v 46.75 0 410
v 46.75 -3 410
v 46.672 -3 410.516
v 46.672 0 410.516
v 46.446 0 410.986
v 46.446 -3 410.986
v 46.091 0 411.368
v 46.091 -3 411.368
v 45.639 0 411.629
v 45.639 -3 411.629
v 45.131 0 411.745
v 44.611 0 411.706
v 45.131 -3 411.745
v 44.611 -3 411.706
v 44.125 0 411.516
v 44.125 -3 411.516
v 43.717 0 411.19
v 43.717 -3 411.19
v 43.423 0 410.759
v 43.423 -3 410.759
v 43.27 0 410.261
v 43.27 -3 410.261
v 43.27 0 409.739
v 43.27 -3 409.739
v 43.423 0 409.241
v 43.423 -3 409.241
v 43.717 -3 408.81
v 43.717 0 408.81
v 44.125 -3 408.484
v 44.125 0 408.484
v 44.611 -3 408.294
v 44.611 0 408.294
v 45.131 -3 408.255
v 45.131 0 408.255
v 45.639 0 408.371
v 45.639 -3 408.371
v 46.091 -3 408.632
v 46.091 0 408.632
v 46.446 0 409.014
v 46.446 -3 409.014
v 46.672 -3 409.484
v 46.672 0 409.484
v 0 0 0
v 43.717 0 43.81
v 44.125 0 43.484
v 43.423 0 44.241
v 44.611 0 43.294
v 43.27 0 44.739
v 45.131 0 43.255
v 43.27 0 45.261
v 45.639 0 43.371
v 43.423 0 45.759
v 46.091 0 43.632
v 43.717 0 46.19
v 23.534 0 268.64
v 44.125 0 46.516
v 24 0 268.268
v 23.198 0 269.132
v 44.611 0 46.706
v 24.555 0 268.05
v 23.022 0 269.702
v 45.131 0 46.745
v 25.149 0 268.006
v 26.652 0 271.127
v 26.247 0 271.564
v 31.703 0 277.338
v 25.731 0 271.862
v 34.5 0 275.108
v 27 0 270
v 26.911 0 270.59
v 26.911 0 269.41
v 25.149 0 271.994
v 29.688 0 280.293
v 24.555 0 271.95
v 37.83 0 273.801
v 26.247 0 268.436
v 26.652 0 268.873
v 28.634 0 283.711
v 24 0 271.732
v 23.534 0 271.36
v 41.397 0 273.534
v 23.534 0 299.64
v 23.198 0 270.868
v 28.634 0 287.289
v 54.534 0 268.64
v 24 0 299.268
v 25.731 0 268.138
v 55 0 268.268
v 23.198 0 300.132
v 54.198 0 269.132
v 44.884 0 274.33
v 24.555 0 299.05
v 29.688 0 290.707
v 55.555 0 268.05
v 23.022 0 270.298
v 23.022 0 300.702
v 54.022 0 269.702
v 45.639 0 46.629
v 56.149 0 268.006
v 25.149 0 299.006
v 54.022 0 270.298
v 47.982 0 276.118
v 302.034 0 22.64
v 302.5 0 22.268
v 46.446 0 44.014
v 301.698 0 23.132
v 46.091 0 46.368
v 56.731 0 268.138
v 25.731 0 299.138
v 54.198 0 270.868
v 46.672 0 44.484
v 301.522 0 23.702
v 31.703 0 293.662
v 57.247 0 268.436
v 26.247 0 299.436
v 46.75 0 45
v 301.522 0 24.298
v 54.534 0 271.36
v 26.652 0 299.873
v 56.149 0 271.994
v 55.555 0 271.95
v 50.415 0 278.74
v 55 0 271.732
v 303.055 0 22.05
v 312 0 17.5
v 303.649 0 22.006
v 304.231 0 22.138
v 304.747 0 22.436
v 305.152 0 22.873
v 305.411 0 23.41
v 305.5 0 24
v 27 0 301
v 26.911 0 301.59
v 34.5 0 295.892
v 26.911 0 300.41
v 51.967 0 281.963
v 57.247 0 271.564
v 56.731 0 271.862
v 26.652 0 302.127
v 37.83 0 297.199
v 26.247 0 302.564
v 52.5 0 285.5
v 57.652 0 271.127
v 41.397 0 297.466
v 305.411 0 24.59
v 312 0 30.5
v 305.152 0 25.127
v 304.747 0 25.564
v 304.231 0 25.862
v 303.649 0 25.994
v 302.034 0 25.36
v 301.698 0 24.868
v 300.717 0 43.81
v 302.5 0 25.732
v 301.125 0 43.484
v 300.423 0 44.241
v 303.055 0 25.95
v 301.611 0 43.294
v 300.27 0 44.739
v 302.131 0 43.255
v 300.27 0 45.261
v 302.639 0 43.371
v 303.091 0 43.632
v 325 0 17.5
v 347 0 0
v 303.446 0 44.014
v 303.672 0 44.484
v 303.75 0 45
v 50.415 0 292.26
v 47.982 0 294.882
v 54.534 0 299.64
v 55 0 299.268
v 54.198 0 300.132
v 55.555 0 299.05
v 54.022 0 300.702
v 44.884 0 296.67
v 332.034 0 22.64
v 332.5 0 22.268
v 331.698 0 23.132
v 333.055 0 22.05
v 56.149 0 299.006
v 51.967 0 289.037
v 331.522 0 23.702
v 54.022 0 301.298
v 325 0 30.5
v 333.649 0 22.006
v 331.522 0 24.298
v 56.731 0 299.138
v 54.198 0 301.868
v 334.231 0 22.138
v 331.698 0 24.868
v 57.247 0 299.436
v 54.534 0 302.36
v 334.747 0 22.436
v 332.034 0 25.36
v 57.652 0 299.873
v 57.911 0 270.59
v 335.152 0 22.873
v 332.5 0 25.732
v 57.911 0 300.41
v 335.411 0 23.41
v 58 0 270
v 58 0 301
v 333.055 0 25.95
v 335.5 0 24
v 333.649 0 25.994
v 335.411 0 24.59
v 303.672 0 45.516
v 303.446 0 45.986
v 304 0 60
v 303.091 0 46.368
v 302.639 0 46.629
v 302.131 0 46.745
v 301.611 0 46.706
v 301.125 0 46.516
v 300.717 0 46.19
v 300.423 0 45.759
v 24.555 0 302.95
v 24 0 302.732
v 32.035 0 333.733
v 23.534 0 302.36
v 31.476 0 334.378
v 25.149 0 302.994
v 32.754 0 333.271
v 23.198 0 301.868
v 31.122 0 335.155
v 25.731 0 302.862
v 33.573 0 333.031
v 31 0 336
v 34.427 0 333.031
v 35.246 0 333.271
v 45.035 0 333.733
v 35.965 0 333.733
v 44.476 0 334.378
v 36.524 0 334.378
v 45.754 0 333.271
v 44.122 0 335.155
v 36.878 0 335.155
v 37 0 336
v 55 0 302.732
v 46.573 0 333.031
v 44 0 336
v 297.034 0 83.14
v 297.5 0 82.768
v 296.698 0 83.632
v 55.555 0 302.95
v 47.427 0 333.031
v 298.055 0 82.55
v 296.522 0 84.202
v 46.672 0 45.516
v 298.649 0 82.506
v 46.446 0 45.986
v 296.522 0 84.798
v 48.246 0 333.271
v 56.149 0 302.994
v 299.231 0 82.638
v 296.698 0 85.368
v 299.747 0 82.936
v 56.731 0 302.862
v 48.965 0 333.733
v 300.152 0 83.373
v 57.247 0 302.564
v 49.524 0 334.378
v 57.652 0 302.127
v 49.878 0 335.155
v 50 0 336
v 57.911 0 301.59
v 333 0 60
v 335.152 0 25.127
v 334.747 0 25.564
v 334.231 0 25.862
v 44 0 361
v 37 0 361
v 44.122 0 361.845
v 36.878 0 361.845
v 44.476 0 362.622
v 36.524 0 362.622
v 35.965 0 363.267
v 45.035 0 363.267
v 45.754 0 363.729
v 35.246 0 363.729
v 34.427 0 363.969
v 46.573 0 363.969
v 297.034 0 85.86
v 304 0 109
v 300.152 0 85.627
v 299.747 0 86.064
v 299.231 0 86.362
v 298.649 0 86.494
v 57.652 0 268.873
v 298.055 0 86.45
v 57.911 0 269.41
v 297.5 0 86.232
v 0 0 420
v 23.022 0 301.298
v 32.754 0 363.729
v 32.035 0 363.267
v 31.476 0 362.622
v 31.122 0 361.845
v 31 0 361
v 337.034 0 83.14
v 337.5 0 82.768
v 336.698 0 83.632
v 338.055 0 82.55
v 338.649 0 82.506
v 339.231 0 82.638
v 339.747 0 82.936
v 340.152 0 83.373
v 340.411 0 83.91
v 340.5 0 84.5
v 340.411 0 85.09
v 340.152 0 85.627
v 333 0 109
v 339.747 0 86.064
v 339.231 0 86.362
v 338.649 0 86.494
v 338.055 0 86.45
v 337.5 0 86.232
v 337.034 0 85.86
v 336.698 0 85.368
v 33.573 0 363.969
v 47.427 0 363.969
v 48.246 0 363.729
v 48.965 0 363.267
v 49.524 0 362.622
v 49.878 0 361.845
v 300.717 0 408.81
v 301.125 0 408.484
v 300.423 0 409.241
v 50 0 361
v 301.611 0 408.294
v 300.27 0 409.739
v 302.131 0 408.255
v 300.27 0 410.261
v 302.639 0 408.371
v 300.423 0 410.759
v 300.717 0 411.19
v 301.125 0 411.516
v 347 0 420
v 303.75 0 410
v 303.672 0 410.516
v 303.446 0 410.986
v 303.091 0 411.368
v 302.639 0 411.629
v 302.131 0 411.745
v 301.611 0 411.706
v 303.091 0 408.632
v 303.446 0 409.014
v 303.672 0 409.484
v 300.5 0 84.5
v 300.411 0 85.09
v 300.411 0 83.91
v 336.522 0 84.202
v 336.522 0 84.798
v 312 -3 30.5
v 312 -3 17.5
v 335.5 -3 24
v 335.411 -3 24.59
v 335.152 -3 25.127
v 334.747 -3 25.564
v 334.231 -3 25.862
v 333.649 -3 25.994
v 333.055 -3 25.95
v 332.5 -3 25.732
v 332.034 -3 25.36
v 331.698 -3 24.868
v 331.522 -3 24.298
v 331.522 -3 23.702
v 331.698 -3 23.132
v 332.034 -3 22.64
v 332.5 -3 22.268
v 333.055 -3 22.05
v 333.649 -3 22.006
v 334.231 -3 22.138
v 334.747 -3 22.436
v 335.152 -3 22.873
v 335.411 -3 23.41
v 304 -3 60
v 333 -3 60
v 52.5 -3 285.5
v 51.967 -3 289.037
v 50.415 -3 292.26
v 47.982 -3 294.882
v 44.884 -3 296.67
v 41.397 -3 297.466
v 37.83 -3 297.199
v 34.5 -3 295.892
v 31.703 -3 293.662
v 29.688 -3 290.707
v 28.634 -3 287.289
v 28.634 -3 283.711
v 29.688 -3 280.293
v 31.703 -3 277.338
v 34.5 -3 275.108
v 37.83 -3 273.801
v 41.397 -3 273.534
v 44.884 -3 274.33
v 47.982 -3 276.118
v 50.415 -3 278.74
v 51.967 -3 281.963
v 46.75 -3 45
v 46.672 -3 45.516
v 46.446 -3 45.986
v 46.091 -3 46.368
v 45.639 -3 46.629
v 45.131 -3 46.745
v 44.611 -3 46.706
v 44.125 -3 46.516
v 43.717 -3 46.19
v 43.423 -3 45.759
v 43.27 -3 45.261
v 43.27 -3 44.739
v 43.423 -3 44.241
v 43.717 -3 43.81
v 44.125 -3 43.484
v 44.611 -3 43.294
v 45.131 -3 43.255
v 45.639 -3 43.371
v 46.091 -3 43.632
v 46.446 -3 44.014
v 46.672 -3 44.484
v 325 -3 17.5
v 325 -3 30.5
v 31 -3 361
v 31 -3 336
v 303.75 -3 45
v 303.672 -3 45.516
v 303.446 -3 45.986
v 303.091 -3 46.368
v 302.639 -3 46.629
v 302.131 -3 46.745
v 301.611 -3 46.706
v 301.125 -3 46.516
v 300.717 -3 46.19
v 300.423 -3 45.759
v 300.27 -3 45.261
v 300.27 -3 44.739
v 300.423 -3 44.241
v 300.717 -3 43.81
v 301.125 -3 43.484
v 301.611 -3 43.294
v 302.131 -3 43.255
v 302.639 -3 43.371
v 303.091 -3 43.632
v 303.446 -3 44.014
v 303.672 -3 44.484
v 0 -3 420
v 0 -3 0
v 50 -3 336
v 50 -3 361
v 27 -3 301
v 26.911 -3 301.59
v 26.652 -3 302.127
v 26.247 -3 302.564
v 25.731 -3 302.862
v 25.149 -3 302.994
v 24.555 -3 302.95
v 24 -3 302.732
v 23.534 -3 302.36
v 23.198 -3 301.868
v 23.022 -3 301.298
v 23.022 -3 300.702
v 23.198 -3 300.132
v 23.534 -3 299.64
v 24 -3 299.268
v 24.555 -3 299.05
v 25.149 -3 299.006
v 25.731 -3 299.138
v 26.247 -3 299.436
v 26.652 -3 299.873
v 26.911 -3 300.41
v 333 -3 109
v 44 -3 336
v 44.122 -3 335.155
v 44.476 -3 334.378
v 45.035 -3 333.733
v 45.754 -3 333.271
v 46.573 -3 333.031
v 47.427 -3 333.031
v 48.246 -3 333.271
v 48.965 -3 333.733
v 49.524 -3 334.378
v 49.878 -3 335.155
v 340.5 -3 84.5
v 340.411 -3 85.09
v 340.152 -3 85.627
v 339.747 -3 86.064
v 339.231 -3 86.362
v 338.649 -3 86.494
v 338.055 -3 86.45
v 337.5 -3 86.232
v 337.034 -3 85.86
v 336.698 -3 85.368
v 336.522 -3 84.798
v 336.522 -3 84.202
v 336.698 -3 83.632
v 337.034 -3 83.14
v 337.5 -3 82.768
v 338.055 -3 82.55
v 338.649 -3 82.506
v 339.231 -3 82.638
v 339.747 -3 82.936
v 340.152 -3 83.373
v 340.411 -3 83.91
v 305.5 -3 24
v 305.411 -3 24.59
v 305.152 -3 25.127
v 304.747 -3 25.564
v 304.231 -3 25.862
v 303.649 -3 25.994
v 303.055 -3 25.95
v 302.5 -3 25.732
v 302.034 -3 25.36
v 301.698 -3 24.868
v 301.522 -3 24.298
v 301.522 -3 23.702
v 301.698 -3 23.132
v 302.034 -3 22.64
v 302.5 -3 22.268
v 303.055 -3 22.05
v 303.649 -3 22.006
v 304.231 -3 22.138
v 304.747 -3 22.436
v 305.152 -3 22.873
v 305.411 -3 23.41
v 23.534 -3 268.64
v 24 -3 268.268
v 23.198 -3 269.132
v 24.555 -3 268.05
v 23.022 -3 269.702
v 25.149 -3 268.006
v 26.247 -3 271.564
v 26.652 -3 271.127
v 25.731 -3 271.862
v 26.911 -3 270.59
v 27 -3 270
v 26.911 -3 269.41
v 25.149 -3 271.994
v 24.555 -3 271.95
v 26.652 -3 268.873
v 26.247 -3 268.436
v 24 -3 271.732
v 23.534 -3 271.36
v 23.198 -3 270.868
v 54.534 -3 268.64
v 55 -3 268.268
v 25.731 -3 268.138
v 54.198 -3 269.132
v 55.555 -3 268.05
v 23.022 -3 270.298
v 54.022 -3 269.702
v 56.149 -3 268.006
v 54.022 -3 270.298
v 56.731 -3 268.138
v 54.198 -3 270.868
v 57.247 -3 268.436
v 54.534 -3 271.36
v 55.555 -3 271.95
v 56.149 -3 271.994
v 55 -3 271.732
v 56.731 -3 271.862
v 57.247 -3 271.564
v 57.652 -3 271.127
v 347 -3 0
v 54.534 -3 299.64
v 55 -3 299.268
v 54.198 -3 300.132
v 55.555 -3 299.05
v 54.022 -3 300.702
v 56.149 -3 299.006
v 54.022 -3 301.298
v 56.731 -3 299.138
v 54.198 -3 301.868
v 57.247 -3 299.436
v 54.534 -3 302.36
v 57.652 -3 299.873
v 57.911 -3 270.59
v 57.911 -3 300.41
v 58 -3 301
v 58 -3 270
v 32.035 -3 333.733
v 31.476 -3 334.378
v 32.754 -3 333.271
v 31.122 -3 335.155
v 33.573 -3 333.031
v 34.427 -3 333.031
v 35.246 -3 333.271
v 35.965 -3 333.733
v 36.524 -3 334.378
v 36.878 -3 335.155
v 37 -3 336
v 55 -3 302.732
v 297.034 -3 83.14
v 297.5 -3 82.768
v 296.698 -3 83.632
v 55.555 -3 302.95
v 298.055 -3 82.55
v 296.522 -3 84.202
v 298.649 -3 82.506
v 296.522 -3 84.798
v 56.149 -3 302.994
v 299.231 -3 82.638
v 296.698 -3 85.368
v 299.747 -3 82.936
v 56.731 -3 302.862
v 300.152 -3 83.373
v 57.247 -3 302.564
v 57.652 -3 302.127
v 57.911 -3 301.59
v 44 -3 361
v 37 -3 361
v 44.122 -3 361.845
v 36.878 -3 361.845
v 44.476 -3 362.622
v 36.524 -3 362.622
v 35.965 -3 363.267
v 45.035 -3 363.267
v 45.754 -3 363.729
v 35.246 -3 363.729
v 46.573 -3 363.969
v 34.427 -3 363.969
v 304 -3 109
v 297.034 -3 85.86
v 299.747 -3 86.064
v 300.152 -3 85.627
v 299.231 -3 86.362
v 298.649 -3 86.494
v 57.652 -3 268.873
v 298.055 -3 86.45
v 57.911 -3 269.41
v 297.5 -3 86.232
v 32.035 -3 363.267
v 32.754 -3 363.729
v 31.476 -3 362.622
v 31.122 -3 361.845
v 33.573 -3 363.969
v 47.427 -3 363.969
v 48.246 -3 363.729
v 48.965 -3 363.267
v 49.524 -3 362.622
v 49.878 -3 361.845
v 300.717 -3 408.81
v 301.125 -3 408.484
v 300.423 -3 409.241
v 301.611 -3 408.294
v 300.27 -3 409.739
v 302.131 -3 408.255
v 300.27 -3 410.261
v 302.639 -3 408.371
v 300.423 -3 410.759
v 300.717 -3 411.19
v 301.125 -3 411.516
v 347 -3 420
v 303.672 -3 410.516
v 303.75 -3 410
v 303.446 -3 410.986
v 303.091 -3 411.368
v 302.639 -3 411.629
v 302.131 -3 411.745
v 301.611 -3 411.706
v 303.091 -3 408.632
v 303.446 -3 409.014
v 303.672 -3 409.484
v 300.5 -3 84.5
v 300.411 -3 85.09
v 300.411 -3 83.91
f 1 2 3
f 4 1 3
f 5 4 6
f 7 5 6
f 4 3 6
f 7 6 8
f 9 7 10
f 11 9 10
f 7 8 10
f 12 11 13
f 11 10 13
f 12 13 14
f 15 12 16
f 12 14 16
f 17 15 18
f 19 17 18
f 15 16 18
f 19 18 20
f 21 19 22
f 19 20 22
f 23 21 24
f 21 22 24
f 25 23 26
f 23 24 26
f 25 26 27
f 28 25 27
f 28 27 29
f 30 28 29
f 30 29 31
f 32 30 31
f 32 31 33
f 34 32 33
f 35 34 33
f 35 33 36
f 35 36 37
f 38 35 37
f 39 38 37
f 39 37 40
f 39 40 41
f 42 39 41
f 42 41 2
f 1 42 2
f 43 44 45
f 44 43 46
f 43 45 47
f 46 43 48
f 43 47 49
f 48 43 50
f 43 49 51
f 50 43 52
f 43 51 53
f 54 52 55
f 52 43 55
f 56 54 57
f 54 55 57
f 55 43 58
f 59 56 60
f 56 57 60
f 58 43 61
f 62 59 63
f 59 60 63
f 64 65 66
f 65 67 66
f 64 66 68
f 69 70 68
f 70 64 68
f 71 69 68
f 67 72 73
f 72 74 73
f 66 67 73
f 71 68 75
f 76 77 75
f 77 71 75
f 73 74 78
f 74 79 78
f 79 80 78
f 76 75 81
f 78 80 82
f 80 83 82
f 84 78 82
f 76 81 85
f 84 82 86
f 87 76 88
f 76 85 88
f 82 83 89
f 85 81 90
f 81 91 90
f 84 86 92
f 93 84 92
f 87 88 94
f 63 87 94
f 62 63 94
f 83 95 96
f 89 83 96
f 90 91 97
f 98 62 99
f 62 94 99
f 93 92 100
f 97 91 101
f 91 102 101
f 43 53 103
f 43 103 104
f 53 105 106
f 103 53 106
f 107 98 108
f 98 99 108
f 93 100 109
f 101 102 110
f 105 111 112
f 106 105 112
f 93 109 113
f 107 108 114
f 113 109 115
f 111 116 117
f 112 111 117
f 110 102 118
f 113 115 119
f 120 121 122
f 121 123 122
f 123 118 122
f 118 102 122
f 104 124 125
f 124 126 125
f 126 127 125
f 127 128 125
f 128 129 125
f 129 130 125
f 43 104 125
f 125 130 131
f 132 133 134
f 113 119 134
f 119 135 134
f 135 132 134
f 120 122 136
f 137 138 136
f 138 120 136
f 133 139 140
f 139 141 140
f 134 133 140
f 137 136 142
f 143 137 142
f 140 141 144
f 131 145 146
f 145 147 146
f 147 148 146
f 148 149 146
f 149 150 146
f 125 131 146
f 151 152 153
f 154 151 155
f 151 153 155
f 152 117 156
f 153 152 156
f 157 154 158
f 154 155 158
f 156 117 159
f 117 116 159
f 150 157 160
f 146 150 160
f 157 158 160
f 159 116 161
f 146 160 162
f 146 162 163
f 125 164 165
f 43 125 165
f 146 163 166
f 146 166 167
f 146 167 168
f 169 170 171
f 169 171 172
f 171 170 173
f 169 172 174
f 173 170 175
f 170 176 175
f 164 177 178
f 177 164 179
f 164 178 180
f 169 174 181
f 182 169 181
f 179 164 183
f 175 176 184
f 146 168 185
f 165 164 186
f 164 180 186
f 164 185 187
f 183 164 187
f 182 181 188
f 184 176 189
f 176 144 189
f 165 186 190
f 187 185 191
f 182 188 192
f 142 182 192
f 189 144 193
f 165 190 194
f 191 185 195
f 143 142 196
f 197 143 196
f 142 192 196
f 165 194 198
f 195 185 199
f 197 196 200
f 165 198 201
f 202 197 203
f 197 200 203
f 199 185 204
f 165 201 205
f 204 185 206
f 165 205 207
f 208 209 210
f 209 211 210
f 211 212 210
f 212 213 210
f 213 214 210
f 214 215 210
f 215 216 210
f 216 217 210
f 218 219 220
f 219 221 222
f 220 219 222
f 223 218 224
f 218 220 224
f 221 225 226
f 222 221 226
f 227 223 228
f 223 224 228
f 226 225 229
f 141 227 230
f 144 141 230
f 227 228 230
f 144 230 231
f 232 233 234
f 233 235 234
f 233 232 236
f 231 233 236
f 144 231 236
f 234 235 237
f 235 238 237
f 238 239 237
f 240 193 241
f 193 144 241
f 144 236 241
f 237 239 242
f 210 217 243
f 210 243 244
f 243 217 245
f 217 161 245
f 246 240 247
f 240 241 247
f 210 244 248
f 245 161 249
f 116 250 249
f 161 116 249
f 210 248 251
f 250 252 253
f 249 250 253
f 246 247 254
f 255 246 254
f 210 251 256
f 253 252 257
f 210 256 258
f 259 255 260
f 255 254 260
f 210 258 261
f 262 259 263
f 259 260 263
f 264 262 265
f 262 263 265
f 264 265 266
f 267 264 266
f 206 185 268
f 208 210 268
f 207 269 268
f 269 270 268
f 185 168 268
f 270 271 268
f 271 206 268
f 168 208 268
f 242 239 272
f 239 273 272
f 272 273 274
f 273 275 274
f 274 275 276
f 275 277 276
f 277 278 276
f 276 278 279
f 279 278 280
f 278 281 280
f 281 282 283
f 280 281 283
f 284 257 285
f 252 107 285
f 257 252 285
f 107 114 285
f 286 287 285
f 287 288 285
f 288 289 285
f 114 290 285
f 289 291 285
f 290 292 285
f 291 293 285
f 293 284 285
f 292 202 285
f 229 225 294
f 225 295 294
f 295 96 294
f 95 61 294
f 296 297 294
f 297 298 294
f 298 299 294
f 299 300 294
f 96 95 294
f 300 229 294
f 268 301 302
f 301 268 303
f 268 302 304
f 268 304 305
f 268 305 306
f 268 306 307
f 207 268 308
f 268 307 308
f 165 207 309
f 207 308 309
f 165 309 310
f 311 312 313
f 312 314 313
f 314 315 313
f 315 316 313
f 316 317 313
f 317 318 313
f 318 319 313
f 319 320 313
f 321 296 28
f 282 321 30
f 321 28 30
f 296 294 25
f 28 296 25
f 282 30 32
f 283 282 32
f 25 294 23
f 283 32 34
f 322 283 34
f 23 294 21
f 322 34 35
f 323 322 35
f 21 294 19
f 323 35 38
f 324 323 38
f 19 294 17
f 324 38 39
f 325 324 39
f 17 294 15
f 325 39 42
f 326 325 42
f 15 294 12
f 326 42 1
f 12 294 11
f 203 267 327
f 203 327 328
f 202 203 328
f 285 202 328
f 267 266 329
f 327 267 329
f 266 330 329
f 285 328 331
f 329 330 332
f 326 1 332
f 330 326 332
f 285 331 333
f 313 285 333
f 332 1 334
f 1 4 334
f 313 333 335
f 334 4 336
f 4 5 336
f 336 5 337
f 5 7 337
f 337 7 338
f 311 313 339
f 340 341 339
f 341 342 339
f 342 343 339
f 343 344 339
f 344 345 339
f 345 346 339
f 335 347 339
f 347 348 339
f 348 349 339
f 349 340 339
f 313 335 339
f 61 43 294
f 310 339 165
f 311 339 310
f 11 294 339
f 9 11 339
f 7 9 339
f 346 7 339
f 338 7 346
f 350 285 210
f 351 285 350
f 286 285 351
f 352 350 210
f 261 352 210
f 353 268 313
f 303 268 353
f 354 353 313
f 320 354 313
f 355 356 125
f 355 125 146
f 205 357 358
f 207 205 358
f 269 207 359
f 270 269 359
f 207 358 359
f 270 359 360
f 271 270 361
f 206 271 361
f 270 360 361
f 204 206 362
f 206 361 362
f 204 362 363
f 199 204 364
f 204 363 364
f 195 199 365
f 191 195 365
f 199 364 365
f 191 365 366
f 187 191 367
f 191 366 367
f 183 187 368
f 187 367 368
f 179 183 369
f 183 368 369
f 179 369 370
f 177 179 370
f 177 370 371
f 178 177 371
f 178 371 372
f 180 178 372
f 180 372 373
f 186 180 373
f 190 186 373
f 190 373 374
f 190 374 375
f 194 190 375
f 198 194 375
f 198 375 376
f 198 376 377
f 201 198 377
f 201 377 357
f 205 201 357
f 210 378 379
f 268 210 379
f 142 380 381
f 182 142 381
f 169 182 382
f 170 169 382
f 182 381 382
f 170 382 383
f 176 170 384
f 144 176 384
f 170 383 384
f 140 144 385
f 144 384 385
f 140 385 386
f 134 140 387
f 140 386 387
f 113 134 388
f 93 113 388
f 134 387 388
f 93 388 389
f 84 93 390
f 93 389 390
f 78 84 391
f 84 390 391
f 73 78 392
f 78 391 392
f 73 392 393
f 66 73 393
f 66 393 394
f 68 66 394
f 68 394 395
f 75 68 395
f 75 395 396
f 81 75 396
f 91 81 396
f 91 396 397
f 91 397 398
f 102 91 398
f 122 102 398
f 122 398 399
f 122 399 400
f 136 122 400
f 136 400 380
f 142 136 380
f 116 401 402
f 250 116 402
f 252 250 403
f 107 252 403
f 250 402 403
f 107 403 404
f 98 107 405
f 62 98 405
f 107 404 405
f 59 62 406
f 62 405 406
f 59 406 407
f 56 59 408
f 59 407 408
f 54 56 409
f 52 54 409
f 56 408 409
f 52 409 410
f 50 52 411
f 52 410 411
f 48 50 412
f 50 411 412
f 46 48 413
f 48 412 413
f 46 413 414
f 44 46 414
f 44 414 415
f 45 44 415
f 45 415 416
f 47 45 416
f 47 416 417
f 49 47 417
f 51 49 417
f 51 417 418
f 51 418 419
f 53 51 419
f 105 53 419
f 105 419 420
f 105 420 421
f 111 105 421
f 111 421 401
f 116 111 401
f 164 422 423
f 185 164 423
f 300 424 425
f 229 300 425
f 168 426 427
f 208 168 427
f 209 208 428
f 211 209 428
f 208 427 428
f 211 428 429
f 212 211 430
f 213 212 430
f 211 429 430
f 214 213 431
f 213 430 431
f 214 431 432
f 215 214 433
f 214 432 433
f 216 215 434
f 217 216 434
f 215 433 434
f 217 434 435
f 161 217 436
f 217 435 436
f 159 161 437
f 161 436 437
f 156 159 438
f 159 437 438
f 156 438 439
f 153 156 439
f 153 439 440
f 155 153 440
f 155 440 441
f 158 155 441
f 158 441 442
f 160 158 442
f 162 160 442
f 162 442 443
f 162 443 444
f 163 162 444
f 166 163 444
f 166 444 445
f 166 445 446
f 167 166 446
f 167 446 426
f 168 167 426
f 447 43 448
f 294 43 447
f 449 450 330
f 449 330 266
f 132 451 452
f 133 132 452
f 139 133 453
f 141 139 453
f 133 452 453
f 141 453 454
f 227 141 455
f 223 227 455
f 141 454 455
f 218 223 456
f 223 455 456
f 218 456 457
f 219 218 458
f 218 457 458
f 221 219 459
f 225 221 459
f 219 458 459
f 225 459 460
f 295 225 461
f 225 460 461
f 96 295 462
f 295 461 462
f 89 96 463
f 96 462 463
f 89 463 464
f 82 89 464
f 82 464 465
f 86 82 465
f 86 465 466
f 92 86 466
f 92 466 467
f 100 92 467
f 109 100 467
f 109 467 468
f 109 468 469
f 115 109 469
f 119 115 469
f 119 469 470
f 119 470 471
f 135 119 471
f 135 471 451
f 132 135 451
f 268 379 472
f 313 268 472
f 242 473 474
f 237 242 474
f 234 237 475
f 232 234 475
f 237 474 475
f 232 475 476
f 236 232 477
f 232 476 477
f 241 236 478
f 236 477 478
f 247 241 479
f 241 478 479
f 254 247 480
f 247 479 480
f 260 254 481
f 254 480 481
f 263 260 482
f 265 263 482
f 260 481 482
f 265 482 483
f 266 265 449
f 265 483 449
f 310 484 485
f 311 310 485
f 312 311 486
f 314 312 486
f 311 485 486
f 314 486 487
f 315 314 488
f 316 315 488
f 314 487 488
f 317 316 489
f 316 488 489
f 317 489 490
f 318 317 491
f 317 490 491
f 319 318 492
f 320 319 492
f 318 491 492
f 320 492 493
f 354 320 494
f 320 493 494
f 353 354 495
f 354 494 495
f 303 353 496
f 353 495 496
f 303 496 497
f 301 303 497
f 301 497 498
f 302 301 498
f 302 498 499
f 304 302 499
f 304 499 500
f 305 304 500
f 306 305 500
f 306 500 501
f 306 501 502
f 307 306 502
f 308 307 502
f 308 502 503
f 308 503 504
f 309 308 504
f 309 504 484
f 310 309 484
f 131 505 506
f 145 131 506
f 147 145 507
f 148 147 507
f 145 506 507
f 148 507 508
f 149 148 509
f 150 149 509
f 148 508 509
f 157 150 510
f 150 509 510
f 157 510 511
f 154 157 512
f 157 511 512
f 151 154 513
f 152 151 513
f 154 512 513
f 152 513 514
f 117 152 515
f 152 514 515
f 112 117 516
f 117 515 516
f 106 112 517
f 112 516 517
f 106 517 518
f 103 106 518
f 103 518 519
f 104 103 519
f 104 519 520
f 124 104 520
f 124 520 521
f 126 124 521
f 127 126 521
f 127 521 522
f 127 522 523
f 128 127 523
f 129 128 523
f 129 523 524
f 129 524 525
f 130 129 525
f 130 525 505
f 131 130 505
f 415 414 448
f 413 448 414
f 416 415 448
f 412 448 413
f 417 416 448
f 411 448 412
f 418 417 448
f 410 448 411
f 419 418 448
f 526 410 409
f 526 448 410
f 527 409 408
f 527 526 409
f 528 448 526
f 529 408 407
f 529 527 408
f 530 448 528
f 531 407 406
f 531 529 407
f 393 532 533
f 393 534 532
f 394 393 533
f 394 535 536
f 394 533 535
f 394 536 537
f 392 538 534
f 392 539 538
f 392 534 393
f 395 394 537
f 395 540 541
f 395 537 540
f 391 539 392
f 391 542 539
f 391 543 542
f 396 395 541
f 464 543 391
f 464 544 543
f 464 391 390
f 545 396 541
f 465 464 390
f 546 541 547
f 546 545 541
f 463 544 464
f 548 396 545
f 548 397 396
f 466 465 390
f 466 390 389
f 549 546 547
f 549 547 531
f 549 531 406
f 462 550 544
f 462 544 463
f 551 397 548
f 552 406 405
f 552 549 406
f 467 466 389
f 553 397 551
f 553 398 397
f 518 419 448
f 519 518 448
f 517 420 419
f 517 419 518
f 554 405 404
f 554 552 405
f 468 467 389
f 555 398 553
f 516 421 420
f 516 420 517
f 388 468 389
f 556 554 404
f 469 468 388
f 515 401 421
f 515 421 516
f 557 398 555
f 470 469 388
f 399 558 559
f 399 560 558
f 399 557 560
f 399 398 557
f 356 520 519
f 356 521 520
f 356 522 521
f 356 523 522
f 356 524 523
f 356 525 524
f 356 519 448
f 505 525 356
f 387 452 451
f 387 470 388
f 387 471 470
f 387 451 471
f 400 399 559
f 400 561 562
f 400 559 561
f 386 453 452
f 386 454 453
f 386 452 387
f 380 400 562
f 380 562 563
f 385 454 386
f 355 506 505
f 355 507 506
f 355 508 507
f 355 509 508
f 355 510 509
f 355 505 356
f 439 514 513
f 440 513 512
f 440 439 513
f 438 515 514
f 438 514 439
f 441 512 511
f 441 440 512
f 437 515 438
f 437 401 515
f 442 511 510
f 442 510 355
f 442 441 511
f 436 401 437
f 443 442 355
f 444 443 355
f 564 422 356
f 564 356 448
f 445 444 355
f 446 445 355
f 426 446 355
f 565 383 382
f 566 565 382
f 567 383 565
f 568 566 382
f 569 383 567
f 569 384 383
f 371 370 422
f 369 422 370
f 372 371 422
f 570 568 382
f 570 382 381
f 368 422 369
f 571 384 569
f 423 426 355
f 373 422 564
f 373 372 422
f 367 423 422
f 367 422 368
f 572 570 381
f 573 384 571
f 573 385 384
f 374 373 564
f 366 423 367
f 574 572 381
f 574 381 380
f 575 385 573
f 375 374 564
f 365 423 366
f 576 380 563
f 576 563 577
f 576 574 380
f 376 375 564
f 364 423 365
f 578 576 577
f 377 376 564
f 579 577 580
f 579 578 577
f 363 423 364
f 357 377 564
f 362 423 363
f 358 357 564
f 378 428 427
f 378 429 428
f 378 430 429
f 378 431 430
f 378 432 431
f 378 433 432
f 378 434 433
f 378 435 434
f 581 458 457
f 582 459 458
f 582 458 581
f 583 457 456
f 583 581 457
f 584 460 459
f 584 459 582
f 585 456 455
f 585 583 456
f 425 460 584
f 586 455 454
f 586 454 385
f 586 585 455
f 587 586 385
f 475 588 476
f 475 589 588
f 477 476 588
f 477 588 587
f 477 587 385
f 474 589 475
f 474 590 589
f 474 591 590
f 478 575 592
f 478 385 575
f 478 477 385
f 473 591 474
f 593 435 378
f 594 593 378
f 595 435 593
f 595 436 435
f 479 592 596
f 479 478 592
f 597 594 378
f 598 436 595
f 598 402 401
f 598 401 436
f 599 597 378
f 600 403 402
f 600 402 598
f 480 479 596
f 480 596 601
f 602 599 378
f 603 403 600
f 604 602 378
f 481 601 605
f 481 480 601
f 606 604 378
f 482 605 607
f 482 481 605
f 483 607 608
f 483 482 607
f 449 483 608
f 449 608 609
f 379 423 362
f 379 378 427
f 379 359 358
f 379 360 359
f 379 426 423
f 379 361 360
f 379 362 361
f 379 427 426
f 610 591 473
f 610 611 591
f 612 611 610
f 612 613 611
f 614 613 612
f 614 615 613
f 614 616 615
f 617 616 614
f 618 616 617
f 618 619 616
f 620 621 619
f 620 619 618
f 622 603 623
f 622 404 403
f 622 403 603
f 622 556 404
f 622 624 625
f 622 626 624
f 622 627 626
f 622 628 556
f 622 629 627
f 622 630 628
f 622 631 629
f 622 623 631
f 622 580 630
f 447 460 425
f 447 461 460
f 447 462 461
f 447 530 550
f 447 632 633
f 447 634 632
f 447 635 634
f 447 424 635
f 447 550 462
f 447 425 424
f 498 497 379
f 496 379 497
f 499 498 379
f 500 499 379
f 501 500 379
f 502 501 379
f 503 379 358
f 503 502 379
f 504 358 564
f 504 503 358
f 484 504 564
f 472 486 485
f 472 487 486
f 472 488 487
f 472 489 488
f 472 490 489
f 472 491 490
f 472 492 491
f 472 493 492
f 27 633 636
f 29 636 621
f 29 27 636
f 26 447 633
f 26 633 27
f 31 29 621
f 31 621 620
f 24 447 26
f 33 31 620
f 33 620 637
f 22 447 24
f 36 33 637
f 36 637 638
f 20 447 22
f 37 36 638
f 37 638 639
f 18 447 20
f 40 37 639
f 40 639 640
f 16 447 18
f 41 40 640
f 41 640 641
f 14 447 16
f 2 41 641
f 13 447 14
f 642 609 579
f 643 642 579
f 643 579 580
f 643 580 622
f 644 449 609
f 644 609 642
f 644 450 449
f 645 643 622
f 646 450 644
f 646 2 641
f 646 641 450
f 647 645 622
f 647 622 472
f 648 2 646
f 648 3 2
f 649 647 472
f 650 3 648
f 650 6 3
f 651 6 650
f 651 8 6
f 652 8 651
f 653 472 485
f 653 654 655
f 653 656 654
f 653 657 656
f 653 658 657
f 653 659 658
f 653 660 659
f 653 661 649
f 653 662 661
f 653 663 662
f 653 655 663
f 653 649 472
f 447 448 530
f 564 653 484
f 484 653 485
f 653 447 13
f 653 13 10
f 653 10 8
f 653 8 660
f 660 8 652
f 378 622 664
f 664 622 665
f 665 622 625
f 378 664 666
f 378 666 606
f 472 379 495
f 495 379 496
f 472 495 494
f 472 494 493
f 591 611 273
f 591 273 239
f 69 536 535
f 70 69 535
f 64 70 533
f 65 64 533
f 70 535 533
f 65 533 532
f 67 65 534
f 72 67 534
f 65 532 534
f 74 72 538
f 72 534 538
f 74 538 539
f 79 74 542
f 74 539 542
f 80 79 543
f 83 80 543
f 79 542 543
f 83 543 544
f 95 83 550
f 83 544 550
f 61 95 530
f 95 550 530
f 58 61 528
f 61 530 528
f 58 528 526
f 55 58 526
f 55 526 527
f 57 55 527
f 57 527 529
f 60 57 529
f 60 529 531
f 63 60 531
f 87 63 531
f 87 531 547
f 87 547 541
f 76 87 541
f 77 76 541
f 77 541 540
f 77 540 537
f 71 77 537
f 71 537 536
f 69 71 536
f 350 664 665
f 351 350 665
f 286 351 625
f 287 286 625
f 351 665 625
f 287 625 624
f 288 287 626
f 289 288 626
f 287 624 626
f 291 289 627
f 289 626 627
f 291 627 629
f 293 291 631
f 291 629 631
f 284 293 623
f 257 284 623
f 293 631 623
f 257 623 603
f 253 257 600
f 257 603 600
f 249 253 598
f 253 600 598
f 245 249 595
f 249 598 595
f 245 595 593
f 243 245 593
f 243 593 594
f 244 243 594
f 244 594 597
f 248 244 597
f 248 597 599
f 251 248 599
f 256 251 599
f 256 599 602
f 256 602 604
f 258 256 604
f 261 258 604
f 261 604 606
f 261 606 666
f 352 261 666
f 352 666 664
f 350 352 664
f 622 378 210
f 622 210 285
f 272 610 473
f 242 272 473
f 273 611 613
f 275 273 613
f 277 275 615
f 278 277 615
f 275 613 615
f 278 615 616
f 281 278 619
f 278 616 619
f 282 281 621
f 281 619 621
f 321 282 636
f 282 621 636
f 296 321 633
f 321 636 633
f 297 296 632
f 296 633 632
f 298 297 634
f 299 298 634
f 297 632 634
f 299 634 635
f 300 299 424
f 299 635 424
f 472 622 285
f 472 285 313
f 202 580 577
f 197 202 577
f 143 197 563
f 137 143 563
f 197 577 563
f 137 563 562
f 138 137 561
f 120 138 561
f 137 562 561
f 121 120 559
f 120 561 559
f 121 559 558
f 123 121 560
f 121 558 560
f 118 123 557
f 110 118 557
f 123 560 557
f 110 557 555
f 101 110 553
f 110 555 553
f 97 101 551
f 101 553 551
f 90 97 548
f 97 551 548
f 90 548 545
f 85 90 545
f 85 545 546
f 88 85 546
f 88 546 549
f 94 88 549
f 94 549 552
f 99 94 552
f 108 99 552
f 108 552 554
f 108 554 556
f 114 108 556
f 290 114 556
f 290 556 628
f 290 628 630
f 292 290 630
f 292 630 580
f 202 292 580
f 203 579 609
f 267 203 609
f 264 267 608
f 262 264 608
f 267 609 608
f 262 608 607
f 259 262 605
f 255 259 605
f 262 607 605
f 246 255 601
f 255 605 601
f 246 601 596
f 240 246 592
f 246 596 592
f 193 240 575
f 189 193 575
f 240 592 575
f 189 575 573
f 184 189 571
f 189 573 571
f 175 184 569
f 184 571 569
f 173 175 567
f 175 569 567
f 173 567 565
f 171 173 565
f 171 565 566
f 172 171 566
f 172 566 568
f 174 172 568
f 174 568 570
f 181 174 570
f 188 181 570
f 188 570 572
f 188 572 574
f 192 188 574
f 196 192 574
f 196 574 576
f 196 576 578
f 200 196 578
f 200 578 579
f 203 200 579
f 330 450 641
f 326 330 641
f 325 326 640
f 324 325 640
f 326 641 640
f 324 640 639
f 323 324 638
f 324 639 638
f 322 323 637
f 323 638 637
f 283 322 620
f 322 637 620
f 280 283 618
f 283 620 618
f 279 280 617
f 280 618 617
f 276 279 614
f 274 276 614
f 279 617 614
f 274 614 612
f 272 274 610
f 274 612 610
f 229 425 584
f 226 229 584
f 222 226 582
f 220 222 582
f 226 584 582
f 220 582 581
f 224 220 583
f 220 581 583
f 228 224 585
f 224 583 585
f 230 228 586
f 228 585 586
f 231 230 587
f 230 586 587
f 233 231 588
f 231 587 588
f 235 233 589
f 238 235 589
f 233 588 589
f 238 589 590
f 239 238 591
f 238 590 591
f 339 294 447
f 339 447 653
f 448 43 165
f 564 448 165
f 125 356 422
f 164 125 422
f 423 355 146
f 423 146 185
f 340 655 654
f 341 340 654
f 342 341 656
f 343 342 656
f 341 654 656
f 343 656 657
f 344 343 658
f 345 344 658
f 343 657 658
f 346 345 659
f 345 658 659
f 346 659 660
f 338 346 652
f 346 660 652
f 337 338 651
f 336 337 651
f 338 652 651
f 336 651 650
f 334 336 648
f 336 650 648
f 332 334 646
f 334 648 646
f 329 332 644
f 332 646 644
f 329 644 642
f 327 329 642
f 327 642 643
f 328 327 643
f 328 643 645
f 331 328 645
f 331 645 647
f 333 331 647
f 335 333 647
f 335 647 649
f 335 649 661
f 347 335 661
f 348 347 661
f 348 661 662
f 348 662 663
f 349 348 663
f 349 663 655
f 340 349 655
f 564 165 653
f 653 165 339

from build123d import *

# Parameters (mm, degrees)
SKETCH_W        = 347
SKETCH_H        = 420
PAD_DEPTH       = 3
SKETCH001_R     = 1.75
POCKET_DEPTH    = 3.001
SKETCH002_R     = 2
SKETCH002_R_2   = 12
POCKET001_DEPTH = 5
SKETCH003_R     = 2
SKETCH003_W     = 29
SKETCH003_H     = 49
SKETCH003_W_2   = 13
SKETCH003_H_2   = 13
POCKET002_DEPTH = 3.001


with BuildPart() as part:
    # Sketch → Pad (new body)
    with BuildSketch(Plane.XZ):
        with Locations((173.5, 210)):
            Rectangle(SKETCH_W, SKETCH_H)
    extrude(amount=PAD_DEPTH)

    # Sketch001 (on Face6 of Pad) → Pocket (cut, through all)
    with BuildSketch(Plane.XZ.offset(3)):
        with Locations((45, 45)):
            Circle(SKETCH001_R)
        with Locations((302, 45)):
            Circle(SKETCH001_R)
        with Locations((302, 410)):
            Circle(SKETCH001_R)
        with Locations((45, 410)):
            Circle(SKETCH001_R)
    extrude(amount=-POCKET_DEPTH, mode=Mode.SUBTRACT)

    # Sketch002 (on Face5 of Pocket) → Pocket001 (cut)
    with BuildSketch(Plane.XZ.offset(3)):
        with Locations((25, 301)):
            Circle(SKETCH002_R)
        with Locations((25, 270)):
            Circle(SKETCH002_R)
        with Locations((56, 270)):
            Circle(SKETCH002_R)
        with Locations((56, 301)):
            Circle(SKETCH002_R)
        with Locations((40.5, 285.5)):
            Circle(SKETCH002_R_2)
        with BuildLine():
            ThreePointArc((37, 361), (34, 364), (31, 361))
            Line((31, 361), (31, 336))
            ThreePointArc((31, 336), (34, 333), (37, 336))
            Line((37, 361), (37, 336))
        make_face()
        with BuildLine():
            ThreePointArc((50, 361), (47, 364), (44, 361))
            Line((44, 361), (44, 336))
            ThreePointArc((44, 336), (47, 333), (50, 336))
            Line((50, 361), (50, 336))
        make_face()
    extrude(amount=-POCKET001_DEPTH, mode=Mode.SUBTRACT)

    # Sketch003 (on Face5 of Pocket001) → Pocket002 (cut, through all)
    with BuildSketch(Plane.XZ.offset(3)):
        with Locations((298.5, 84.5)):
            Circle(SKETCH003_R)
        with Locations((338.5, 84.5)):
            Circle(SKETCH003_R)
        with Locations((303.5, 24)):
            Circle(SKETCH003_R)
        with Locations((333.5, 24)):
            Circle(SKETCH003_R)
        with Locations((318.5, 84.5)):
            Rectangle(SKETCH003_W, SKETCH003_H)
        with Locations((318.5, 24)):
            Rectangle(SKETCH003_W_2, SKETCH003_H_2)
    extrude(amount=-POCKET002_DEPTH, mode=Mode.SUBTRACT)


solid = part.part
